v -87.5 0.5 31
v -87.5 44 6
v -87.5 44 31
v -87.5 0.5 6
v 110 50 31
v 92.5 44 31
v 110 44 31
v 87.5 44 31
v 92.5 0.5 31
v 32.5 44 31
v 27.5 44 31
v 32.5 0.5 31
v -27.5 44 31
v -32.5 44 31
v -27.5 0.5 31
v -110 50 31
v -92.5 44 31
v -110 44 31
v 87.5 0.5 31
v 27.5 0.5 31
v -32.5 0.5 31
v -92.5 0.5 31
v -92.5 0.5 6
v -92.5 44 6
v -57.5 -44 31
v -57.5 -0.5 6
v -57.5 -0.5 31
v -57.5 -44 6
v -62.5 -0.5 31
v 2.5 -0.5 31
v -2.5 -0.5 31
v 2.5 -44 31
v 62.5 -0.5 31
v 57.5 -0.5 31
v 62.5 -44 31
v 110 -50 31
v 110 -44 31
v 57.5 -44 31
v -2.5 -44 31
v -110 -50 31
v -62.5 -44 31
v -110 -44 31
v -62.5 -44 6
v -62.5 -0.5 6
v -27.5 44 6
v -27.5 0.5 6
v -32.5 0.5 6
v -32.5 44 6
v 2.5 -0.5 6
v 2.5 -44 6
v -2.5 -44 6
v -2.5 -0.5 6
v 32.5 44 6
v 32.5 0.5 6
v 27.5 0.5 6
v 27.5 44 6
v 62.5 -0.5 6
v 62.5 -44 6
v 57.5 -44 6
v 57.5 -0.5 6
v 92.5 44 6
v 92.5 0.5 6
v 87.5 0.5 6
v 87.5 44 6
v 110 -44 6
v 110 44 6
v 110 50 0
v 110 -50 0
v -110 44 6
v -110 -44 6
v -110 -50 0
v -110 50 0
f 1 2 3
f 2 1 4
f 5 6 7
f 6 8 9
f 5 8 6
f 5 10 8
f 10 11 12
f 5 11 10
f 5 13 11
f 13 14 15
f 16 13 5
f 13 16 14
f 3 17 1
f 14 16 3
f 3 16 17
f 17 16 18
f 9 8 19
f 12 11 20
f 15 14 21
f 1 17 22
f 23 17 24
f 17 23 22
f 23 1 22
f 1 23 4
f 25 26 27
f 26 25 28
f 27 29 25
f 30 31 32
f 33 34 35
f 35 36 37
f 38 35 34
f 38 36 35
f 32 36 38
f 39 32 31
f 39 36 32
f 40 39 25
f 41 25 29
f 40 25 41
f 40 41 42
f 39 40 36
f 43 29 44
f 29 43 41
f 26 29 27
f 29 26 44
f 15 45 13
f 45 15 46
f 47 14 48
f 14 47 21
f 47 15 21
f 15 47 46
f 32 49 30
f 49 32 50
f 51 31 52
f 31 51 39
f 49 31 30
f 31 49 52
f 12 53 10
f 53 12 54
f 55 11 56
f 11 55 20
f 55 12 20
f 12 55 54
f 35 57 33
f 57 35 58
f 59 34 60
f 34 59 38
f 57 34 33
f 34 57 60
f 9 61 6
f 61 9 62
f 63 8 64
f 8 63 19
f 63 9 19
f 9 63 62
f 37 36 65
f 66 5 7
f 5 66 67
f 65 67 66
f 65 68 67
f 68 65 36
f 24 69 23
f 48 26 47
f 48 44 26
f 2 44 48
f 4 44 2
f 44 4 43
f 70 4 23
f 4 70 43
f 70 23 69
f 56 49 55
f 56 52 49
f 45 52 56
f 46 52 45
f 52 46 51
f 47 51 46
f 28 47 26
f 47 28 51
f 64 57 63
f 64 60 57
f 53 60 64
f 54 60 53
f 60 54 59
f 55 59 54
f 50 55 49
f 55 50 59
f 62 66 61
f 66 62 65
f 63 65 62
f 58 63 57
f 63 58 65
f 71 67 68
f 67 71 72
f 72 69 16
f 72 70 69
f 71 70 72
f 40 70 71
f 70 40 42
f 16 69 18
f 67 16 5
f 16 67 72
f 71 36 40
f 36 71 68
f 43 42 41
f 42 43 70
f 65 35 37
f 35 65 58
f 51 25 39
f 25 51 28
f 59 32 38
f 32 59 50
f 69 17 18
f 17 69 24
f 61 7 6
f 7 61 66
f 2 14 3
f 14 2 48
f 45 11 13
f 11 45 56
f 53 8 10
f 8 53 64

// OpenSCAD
$fn = 32;

// ----------------------------------------------------------------------
// Rib frame 220 x 100 x 31
// 7 ribs at 30 mm pitch, staggered
// ----------------------------------------------------------------------

// --- parameters (mm) ---
frame = [220, 100, 6];  // base plate size (x, y, z)
rail_w = 6;             // side rail width
ribs = 7;               // number of ribs
rib_t = 5;              // rib thickness
rib_h = 25;             // rib height above the base plate
pitch = 30;             // pitch between rib centres

// --- derived feature positions (mm) ---
span = (ribs - 1) * pitch;          // = 180   distance between the outer ribs
origin_x = -span / 2;               // = -90   X of the first rib
rib_len = frame[1] / 2 - rail_w + 0.5;  // = 44.5   length of a staggered rib
rib_y = 0.5 + rib_len / 2;          // = 22.75   Y of a staggered rib centre
row_offset = 2 * rib_y;             // = 45.5   distance between the two rows
feature_centers = [
  [origin_x + 0 * pitch, rib_y],
  [origin_x + 1 * pitch, -rib_y],
  [origin_x + 2 * pitch, rib_y],
  [origin_x + 3 * pitch, -rib_y],
  [origin_x + 4 * pitch, rib_y],
  [origin_x + 5 * pitch, -rib_y],
  [origin_x + 6 * pitch, rib_y]
];   // rib centre line, drives the rib loop

// base plate, two side rails, then the ribs read straight off feature_centers
union() {
  translate([-frame[0] / 2, -frame[1] / 2, 0]) cube(frame);
  translate([-frame[0] / 2, -frame[1] / 2, 0]) cube([frame[0], rail_w, frame[2] + rib_h]);
  translate([-frame[0] / 2, frame[1] / 2 - rail_w, 0]) cube([frame[0], rail_w, frame[2] + rib_h]);
  for (centre = feature_centers)
    translate([centre[0] - rib_t / 2, centre[1] - rib_len / 2, frame[2] - 1])
      cube([rib_t, rib_len, rib_h + 1]);
}
